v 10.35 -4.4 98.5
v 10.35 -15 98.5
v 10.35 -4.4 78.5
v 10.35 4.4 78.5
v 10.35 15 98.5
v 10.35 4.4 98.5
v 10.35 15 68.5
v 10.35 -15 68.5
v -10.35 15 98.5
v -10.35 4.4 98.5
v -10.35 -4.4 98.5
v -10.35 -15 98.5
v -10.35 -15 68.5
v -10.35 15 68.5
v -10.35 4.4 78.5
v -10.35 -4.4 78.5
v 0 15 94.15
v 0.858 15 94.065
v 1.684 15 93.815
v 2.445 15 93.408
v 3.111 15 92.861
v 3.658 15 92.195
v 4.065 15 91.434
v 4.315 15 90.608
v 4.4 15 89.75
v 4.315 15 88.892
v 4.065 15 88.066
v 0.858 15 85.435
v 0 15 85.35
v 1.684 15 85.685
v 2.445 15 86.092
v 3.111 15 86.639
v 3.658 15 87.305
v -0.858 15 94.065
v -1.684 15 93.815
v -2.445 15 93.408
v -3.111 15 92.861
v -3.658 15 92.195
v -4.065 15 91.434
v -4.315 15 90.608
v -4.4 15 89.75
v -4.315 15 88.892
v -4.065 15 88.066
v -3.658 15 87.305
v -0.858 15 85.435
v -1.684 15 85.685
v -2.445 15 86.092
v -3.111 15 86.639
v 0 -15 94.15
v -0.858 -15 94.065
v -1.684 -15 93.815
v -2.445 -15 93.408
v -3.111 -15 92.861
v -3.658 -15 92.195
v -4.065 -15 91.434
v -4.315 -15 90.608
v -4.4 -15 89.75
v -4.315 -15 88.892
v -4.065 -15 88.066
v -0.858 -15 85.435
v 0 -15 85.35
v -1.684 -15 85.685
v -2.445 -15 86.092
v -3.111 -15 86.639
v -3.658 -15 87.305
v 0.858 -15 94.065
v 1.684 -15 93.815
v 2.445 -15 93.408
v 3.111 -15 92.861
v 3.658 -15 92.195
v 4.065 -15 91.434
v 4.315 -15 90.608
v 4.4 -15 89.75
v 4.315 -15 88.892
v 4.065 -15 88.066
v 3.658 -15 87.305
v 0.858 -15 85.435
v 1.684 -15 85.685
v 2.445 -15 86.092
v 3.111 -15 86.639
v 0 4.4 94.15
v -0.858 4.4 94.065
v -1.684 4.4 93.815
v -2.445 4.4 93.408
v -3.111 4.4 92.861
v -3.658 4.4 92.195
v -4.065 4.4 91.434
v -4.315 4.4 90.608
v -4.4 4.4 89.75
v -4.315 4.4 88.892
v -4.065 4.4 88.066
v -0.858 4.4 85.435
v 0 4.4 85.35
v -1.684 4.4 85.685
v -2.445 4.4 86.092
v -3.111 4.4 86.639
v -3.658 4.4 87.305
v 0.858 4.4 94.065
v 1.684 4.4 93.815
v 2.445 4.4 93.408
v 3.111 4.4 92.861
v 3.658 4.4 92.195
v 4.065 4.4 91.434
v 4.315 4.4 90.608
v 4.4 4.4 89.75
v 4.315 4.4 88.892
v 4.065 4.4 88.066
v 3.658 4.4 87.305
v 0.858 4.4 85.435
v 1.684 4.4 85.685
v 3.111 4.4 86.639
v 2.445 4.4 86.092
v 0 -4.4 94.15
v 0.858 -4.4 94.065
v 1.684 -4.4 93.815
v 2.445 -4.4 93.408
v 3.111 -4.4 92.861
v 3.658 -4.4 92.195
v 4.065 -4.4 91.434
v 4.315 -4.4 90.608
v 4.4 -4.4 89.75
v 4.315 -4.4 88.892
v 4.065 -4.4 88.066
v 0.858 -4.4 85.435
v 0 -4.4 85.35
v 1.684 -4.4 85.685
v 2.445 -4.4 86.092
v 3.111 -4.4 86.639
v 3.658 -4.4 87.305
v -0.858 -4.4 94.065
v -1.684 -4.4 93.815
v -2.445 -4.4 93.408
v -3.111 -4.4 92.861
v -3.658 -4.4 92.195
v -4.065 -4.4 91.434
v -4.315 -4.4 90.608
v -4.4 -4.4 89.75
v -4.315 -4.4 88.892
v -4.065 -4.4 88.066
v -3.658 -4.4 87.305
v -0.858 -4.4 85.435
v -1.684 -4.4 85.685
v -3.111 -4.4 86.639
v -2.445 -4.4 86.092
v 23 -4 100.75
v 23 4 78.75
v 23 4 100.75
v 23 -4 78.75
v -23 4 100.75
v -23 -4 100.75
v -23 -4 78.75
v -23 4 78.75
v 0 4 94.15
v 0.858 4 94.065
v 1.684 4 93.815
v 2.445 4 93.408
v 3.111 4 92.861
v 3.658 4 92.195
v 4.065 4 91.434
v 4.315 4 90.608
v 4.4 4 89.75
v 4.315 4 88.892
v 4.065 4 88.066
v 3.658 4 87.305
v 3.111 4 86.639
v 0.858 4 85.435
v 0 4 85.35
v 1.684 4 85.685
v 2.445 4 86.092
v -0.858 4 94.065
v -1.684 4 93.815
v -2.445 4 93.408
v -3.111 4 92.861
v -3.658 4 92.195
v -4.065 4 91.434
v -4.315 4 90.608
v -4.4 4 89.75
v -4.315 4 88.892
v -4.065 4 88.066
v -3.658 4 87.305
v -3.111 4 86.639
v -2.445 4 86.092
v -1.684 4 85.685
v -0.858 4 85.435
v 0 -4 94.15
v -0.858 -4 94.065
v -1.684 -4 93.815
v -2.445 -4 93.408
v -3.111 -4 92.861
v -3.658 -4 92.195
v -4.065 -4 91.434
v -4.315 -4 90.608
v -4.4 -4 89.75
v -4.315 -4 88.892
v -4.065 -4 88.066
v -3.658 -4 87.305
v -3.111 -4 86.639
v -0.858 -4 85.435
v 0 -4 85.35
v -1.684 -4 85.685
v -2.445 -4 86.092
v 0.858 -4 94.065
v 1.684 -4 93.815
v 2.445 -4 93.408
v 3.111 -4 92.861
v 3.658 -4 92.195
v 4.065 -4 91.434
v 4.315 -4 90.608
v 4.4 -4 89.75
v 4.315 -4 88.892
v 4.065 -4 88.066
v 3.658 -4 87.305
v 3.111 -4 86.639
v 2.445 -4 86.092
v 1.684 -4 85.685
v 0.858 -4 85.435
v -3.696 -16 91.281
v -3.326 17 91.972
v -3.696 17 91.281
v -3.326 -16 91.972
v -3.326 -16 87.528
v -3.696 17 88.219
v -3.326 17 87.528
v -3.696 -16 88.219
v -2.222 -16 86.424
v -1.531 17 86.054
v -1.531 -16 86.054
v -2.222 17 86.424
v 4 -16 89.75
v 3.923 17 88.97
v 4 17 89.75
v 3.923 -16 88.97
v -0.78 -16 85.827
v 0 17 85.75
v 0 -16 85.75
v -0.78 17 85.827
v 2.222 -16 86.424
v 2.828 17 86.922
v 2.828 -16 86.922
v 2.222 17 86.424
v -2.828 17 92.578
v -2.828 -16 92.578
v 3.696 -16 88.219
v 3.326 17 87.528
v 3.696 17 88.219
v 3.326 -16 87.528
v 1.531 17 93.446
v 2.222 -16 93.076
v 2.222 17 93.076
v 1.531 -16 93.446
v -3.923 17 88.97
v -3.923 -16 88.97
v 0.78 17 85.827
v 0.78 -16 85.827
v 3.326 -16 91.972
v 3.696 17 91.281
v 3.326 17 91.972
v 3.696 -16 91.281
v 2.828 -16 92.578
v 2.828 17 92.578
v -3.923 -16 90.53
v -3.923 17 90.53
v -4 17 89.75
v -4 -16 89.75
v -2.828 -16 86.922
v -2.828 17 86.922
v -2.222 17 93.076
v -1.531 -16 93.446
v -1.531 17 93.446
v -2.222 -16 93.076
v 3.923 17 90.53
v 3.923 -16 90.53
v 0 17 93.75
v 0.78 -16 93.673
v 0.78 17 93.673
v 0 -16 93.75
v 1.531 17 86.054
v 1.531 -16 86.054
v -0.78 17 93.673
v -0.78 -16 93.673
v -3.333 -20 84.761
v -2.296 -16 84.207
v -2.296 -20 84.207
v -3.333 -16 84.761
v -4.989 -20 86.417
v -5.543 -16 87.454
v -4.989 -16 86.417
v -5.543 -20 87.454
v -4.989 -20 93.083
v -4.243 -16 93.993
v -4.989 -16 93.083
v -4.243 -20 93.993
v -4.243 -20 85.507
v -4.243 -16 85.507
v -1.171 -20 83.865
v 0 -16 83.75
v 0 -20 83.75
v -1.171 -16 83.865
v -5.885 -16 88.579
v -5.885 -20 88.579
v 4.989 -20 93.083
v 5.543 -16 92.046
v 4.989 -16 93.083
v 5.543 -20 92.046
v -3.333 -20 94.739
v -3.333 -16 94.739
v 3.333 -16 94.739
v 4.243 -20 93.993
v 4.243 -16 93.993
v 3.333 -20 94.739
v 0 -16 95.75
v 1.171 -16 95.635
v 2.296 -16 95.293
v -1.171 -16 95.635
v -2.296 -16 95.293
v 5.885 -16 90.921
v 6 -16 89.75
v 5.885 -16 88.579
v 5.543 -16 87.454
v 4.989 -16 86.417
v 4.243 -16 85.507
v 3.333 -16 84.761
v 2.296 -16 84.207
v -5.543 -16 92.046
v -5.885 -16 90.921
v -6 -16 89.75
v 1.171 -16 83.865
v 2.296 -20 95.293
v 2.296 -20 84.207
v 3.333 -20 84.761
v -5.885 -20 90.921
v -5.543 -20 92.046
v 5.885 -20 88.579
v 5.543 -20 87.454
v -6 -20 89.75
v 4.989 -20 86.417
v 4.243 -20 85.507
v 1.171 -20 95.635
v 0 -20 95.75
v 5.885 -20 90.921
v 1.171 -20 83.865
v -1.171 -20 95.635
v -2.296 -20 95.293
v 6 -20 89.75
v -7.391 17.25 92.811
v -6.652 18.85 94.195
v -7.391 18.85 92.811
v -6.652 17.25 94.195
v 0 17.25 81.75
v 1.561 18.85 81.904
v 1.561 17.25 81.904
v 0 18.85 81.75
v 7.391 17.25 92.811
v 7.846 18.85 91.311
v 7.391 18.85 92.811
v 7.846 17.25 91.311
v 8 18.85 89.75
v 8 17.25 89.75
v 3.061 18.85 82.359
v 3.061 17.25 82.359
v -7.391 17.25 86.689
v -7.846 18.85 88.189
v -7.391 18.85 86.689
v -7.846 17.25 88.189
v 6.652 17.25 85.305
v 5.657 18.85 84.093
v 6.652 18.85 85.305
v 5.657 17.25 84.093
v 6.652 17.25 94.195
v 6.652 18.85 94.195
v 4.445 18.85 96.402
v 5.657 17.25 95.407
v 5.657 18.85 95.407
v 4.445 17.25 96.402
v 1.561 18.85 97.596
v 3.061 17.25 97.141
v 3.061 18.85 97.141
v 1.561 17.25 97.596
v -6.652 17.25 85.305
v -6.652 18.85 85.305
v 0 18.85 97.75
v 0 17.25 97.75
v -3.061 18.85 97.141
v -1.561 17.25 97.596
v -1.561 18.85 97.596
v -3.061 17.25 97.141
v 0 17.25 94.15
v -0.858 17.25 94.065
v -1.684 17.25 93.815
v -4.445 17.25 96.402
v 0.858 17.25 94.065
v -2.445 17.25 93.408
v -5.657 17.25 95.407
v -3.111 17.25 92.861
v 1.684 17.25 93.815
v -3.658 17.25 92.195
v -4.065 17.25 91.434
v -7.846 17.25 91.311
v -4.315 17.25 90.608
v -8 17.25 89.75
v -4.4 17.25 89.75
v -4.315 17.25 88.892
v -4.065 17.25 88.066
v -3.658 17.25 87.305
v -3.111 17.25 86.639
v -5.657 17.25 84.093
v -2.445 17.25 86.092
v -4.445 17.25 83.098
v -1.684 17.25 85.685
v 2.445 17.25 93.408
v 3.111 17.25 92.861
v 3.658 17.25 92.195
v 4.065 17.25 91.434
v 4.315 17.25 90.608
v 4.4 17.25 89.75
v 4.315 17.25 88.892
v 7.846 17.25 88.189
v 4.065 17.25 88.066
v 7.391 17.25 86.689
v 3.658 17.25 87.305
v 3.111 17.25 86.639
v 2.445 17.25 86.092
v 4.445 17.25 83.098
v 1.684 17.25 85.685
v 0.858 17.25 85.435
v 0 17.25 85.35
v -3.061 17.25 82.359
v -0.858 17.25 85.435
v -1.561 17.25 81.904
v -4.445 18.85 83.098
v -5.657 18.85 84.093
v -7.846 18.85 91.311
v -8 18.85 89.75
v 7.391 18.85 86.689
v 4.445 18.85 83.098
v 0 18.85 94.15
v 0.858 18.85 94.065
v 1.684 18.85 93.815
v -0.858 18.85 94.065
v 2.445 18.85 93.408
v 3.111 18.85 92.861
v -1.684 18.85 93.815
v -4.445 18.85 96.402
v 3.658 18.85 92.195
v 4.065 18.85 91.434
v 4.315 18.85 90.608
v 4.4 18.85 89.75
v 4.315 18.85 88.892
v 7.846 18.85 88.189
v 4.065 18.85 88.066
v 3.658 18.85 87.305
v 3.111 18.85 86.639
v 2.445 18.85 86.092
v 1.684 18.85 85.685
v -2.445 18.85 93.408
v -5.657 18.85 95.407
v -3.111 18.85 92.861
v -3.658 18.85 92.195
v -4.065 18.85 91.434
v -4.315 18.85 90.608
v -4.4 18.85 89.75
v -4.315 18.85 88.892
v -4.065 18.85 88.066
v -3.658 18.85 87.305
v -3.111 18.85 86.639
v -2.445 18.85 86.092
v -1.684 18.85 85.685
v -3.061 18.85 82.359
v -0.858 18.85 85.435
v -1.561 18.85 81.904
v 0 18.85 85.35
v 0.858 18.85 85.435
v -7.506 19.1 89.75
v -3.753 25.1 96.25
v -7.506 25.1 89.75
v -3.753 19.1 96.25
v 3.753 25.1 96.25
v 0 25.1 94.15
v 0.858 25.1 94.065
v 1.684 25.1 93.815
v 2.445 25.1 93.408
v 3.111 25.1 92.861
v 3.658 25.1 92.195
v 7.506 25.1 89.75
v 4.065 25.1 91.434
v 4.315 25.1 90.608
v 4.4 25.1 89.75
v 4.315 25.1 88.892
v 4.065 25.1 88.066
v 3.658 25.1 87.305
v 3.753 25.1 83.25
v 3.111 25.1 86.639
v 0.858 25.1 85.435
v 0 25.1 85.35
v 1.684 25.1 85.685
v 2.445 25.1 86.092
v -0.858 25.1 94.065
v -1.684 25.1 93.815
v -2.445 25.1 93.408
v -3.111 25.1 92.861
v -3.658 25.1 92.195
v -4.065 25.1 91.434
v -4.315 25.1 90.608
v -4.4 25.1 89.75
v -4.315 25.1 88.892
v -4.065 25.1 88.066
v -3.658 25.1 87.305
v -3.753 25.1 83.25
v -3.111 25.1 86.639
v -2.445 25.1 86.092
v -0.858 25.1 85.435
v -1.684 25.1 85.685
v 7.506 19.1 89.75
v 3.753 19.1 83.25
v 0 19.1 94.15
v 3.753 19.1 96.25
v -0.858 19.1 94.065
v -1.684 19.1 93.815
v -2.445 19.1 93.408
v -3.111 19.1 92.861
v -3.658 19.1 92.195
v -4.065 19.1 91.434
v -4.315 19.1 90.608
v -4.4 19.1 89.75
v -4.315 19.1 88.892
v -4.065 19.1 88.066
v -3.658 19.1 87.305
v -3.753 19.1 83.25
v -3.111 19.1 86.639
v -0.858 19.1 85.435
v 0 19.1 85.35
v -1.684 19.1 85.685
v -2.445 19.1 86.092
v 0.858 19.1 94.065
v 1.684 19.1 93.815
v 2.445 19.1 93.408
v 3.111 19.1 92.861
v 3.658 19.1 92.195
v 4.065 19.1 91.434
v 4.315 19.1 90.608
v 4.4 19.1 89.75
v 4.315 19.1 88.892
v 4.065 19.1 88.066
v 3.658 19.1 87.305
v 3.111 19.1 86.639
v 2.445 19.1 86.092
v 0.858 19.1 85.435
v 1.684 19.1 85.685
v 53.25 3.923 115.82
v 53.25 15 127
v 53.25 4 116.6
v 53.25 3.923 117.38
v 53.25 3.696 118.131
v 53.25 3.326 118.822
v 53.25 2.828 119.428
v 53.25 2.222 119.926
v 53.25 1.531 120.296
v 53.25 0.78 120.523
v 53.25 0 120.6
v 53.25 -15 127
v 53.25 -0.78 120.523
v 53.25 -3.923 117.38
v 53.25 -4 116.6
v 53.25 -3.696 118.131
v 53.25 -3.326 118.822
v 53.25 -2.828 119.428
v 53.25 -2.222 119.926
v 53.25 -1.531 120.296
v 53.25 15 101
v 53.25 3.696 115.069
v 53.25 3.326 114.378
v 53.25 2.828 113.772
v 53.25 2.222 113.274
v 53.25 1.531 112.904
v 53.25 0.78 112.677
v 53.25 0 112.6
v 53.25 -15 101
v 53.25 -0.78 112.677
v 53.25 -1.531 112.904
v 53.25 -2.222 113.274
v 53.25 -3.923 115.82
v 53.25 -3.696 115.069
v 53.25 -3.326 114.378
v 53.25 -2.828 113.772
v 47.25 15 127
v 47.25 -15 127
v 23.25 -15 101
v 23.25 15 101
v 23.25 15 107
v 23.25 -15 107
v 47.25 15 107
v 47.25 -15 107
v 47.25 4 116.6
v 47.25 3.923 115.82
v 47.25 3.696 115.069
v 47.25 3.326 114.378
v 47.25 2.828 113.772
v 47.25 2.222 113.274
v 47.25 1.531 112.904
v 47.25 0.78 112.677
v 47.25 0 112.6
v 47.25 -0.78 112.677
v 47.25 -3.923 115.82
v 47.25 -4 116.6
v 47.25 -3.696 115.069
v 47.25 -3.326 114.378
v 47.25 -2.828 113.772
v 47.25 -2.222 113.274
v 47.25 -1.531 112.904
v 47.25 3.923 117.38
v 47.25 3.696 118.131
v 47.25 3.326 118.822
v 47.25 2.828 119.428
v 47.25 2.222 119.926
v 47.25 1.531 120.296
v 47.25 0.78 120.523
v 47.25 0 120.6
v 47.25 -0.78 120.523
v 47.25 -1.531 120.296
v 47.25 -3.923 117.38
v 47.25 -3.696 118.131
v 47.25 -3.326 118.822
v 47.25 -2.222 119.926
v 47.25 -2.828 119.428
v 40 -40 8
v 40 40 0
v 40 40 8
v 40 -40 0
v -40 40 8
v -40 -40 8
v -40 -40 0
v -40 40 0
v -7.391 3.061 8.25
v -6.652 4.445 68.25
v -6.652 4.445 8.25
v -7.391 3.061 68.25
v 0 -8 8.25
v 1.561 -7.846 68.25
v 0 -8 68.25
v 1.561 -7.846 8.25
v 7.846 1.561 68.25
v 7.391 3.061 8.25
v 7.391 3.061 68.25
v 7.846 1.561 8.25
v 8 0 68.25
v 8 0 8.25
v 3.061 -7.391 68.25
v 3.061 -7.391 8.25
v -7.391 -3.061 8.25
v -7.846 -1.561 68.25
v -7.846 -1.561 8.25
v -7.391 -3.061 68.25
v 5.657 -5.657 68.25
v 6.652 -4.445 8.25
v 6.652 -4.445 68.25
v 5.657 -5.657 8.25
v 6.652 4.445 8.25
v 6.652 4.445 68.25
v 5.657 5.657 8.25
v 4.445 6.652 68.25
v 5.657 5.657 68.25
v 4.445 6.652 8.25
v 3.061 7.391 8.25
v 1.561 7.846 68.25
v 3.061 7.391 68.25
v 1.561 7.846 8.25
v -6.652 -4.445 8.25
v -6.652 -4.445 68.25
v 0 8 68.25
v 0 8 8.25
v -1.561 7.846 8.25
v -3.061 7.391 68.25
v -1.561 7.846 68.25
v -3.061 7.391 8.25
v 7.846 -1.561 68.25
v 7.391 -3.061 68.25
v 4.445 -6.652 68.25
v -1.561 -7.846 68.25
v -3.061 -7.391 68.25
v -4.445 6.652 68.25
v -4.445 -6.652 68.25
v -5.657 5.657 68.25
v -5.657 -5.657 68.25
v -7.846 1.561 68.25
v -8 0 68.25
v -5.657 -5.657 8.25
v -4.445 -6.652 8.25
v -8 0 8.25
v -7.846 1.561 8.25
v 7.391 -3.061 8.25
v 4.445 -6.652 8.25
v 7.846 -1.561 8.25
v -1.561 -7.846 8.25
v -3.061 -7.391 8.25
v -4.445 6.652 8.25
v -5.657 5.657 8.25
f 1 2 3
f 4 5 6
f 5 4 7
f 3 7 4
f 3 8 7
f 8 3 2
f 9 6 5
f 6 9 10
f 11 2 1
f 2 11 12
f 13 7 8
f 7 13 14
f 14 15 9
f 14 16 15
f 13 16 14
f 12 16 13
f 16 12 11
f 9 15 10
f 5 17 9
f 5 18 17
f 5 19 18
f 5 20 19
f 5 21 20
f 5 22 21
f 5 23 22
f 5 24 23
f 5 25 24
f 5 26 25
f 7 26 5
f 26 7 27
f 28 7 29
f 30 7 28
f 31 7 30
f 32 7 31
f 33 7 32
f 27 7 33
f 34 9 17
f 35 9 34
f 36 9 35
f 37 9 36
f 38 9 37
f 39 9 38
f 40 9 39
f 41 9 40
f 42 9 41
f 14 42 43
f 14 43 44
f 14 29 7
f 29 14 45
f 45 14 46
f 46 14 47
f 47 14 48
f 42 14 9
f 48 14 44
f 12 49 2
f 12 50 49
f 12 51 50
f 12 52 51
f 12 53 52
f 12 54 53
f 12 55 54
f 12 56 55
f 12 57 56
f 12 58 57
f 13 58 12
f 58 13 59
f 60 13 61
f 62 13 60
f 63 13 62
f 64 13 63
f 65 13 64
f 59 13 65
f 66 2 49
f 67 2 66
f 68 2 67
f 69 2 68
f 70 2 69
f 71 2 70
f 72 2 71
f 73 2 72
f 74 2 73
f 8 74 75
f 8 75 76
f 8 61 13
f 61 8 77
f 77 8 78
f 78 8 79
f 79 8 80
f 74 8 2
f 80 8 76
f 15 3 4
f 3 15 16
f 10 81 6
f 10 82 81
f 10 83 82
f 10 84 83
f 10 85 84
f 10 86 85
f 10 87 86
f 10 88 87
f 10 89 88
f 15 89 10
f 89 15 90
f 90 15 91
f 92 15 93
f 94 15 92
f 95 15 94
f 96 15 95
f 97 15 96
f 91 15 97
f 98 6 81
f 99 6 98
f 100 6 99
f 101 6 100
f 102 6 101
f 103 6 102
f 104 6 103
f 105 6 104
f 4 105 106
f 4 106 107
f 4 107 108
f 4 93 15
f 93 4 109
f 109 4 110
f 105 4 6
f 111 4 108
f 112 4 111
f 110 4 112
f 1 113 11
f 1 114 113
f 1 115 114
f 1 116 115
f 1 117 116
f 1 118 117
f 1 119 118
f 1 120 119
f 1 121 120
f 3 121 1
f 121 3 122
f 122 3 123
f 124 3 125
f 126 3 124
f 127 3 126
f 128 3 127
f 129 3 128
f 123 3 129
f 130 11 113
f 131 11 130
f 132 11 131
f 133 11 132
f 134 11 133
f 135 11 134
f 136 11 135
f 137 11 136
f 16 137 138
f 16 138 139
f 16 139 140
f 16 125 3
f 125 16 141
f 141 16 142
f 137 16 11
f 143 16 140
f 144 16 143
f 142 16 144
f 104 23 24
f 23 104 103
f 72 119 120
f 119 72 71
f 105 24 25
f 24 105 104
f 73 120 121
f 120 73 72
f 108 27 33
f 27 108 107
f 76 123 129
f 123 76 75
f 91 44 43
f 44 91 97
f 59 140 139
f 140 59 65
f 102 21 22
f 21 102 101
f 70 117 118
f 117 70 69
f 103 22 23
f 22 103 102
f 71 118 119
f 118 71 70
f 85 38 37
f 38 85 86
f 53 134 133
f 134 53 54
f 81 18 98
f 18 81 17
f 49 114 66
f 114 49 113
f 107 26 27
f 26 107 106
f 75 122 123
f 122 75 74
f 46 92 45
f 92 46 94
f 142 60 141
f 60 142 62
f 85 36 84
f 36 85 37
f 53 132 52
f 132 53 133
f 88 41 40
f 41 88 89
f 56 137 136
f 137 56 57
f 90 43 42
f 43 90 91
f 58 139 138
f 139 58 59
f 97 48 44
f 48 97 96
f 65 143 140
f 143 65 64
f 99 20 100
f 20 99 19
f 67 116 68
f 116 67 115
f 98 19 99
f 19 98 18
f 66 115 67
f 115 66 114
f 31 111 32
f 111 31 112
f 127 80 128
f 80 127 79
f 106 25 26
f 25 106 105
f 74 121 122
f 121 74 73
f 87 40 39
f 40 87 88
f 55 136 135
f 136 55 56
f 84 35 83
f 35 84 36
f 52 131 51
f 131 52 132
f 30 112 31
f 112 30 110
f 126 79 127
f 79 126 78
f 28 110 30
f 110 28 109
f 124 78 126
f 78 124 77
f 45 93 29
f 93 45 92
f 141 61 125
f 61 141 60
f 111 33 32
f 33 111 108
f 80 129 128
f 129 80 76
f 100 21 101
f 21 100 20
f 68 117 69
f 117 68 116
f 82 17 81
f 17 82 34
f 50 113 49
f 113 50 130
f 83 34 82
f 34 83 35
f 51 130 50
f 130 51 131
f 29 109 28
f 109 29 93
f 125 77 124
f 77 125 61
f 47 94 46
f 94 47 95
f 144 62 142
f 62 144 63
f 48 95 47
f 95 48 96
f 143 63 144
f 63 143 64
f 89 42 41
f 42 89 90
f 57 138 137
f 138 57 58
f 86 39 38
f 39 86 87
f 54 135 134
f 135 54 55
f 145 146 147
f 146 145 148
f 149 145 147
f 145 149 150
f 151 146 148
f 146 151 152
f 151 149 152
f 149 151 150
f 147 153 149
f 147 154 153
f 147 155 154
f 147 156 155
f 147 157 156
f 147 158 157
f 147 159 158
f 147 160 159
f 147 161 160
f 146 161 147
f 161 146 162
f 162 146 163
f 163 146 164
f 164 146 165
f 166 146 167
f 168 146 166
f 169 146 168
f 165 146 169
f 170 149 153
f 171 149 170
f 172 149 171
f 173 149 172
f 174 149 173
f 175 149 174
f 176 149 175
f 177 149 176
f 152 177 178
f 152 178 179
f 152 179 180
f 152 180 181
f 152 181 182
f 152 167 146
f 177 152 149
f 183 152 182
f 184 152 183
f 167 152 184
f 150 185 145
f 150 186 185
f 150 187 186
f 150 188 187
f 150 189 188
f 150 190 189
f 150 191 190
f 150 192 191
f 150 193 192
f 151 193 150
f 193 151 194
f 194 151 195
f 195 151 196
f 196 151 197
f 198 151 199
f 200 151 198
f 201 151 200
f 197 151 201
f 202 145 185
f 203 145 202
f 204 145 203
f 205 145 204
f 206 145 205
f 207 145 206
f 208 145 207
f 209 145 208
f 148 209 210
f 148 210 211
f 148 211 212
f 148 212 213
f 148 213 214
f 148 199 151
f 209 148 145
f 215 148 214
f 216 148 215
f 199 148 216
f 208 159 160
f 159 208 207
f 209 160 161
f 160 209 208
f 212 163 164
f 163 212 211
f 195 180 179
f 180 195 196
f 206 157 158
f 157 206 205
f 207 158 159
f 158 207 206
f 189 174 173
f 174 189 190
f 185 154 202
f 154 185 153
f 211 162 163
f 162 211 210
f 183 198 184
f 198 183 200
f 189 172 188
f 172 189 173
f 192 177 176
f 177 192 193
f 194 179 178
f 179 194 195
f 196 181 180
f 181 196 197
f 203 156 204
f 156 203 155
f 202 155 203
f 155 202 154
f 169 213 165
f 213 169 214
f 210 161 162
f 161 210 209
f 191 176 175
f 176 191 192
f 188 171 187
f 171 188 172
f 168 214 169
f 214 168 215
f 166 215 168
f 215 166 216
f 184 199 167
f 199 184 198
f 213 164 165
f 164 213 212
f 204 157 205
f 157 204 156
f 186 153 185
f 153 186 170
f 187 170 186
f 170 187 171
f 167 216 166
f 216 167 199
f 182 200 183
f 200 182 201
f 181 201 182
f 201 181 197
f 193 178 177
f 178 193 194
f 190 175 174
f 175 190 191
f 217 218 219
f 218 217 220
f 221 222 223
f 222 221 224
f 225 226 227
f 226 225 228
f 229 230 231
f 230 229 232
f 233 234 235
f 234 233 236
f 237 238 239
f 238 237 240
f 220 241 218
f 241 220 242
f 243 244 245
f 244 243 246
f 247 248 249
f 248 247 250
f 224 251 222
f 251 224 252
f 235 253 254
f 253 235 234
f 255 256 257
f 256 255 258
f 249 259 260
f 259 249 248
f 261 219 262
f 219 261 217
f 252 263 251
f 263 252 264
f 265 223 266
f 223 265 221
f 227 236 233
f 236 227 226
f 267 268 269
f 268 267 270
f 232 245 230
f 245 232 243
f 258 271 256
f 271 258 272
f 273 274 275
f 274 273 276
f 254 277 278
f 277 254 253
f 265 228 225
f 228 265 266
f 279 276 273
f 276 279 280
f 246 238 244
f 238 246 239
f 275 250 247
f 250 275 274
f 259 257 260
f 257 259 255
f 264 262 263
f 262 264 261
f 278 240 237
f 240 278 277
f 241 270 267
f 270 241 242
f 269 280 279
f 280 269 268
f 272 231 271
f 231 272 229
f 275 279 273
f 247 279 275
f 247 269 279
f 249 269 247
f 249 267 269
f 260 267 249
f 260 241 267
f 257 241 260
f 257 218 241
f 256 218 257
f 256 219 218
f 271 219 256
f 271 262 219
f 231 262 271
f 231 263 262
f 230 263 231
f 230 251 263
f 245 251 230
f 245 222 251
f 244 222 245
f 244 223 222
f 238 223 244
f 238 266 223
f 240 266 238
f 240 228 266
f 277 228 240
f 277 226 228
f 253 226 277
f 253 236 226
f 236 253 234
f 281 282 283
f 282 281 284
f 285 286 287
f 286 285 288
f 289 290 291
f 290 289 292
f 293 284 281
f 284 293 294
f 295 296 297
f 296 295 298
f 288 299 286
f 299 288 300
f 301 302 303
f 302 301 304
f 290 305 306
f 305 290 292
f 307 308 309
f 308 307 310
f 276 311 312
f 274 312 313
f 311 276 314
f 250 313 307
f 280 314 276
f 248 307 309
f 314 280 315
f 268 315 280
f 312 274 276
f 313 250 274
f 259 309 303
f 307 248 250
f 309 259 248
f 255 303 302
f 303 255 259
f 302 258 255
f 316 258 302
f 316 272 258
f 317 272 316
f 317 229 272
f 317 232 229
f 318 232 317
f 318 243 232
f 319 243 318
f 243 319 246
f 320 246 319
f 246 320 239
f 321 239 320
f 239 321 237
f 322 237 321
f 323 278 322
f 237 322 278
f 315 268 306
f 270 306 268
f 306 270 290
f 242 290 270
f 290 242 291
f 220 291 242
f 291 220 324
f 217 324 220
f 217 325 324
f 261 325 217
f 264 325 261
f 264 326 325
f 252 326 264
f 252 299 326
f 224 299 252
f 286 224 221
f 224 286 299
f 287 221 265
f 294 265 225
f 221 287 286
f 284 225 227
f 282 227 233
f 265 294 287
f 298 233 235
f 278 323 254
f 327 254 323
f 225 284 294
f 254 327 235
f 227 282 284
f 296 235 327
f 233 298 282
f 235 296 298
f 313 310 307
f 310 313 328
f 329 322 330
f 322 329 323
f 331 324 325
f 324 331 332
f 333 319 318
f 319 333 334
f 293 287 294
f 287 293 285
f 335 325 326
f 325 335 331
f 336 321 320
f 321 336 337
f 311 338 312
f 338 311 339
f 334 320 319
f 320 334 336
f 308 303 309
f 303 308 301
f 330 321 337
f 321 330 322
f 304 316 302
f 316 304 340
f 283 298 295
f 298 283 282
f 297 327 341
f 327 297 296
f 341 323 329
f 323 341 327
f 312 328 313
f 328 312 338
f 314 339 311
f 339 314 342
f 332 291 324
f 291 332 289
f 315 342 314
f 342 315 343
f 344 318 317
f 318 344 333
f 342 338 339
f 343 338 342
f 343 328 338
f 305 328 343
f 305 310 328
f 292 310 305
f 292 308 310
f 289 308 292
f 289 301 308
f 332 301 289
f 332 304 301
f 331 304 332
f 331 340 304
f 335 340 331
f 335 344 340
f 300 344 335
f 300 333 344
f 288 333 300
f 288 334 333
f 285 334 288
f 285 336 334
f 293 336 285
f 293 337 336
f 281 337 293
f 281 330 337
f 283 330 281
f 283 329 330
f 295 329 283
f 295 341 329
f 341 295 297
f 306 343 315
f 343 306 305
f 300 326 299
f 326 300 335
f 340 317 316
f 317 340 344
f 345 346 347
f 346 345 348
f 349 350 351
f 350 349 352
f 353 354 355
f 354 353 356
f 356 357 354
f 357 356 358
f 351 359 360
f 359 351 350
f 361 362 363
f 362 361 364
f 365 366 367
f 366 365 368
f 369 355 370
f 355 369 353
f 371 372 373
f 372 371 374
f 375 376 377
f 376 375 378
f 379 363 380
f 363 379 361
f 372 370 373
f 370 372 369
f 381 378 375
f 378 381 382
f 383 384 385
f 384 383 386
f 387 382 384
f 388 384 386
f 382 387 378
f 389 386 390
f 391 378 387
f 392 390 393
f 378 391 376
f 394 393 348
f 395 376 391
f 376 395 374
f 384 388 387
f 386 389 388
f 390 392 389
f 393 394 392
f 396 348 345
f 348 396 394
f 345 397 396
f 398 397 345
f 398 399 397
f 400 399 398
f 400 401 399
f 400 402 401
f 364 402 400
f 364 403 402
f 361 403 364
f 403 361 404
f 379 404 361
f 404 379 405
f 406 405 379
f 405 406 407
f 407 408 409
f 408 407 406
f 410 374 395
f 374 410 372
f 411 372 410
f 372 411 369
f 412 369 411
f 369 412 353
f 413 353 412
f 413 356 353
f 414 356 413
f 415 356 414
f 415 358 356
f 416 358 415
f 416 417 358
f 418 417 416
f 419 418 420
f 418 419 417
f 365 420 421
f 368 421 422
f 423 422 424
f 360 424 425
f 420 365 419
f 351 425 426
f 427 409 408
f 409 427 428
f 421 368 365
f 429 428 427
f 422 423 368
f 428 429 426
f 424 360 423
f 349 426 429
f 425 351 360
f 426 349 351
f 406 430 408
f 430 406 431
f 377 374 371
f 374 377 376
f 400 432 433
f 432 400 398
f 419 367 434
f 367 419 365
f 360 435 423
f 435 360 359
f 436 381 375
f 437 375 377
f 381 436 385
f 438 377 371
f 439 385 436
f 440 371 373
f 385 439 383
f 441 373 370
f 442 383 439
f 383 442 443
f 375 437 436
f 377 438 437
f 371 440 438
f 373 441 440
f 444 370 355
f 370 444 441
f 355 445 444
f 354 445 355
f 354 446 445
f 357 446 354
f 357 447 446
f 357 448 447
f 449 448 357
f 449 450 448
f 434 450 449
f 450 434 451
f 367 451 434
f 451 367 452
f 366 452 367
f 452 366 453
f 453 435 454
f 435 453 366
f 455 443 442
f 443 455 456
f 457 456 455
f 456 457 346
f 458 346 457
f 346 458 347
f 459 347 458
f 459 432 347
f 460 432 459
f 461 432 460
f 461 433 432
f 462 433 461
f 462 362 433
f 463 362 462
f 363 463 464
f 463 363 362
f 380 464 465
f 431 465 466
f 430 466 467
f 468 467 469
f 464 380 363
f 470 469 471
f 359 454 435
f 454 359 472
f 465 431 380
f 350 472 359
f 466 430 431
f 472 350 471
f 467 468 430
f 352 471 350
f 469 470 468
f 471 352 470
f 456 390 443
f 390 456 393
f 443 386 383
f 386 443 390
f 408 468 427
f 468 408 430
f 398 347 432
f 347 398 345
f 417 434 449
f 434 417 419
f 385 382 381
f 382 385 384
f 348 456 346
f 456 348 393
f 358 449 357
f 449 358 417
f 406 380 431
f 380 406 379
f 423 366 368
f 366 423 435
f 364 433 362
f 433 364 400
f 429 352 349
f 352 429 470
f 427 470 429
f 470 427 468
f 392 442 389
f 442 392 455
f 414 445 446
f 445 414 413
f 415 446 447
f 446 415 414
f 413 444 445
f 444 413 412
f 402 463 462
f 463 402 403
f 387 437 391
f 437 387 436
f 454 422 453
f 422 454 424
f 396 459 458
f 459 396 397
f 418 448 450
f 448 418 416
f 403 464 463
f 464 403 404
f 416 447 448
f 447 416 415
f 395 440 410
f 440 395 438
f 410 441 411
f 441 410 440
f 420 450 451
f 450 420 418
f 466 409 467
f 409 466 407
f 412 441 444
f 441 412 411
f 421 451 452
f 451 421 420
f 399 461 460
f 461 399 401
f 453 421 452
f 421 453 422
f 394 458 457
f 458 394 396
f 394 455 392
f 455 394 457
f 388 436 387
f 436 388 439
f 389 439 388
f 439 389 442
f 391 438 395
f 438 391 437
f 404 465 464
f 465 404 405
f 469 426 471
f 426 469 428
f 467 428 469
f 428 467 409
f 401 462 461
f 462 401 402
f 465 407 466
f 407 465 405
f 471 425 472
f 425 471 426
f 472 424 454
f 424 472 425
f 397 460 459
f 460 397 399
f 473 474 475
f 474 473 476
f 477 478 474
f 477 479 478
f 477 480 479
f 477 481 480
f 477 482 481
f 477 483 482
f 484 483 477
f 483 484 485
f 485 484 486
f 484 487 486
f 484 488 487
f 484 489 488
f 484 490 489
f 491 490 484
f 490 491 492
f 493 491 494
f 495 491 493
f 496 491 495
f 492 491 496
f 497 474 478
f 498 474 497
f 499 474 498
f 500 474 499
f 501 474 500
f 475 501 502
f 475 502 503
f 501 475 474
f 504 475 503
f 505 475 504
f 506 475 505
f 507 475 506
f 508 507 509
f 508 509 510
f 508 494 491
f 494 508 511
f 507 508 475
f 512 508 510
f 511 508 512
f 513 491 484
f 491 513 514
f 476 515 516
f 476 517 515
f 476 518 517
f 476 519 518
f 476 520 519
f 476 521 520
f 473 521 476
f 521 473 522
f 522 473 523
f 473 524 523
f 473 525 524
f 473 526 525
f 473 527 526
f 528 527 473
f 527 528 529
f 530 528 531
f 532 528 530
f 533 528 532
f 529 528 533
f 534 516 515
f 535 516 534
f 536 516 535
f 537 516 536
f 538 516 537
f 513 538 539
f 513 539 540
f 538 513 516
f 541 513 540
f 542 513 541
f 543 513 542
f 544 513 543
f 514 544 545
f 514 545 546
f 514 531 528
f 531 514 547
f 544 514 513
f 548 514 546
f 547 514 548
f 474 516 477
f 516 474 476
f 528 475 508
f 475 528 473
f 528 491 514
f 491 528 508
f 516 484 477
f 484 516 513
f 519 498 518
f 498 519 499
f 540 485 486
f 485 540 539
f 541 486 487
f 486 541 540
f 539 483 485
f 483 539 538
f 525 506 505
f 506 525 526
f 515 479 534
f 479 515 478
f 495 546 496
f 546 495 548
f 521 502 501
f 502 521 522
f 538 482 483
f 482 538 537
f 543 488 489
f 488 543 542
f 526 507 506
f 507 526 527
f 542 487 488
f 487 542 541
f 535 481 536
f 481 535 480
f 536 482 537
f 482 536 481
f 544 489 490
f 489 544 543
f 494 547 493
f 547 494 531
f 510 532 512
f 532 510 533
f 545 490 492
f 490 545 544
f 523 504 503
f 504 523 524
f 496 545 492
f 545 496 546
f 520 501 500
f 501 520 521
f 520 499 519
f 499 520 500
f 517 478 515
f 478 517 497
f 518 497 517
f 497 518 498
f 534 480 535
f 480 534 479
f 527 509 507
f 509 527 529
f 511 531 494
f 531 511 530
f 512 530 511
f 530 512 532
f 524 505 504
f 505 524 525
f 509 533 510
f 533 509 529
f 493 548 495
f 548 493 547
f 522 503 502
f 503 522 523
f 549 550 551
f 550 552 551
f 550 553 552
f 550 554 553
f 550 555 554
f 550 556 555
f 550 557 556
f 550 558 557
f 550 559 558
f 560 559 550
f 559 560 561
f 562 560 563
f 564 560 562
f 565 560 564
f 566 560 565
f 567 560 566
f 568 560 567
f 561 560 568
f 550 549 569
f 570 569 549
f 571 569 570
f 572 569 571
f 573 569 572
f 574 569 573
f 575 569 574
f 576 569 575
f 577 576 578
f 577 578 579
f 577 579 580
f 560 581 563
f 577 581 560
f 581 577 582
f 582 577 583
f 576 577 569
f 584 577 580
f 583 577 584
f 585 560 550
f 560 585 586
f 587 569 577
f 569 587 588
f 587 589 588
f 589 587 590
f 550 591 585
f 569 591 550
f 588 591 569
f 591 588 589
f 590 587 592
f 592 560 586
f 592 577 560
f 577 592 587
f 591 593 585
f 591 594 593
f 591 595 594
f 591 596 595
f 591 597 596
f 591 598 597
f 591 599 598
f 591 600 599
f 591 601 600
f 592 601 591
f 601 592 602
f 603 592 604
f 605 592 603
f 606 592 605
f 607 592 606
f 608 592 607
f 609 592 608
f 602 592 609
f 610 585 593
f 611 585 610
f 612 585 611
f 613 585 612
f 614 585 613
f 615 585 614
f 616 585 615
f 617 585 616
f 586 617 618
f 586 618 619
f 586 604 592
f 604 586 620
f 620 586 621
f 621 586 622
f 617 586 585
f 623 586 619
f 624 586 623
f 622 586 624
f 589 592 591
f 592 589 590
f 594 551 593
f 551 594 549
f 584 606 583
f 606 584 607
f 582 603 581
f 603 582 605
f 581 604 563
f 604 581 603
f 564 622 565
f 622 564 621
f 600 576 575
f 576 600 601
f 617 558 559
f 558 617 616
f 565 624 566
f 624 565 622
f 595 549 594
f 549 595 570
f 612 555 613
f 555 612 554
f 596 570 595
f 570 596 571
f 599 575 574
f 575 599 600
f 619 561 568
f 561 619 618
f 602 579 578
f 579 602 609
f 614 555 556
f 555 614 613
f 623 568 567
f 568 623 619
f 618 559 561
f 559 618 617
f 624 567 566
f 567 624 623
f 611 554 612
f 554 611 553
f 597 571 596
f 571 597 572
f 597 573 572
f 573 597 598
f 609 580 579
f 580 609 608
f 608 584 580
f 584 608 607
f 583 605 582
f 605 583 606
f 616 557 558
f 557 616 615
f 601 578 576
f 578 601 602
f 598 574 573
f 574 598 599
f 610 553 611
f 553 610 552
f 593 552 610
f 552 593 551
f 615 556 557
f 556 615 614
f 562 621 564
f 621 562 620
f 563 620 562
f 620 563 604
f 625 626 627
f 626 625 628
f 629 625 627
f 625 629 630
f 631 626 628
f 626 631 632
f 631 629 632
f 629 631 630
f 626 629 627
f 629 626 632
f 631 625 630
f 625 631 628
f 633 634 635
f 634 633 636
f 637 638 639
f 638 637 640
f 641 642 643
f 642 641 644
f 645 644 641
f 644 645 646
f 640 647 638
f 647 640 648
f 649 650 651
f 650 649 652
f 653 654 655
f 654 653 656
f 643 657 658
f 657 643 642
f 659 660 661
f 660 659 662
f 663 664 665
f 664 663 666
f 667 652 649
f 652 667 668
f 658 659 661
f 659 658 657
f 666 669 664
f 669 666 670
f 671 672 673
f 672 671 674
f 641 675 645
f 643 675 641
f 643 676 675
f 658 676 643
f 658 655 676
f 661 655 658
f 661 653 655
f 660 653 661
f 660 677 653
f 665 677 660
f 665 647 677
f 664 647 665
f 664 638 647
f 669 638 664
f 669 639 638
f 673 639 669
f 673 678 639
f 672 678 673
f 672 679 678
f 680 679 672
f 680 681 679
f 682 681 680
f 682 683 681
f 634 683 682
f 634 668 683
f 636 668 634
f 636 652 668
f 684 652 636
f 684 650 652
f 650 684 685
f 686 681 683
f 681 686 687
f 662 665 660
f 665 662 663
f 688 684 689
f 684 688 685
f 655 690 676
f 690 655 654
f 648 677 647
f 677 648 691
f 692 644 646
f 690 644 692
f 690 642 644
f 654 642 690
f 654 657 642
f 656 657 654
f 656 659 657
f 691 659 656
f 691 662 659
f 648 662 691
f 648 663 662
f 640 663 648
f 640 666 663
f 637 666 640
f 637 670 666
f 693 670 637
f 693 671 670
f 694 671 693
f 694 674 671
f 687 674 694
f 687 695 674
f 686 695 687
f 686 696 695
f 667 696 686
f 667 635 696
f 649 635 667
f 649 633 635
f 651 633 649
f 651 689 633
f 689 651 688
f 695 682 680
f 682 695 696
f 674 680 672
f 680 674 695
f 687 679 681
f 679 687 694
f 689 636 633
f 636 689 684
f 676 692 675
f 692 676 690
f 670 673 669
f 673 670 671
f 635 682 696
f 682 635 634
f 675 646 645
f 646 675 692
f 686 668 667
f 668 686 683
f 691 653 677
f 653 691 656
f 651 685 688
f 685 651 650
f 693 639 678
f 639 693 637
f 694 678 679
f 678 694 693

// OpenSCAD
$fn = 32;

// ------------------------------------------------------------------------
// Lamp arm: column d16 x 60 mm, arm 46 mm
// Every part is its own module, assembly() places every instance.
// ------------------------------------------------------------------------

// --- part 1 ---
module lamp_base() {
  difference() {
    translate([-40, -40, 0]) cube([80, 80, 8]);
  }
}

// --- part 2 ---
module lamp_column() {
  cylinder(h = 60, d = 16);
}

// --- part 3 ---
module head_fork() {
  difference() {
    translate([-10.35, -15, 0]) cube([20.7, 30, 30]);
    translate([-11.35, -4.4, 10]) cube([22.7, 8.8, 21]);
    translate([0, 0, 21.25]) rotate([90, 0, 0]) cylinder(h = 32, d = 8.8, center = true);
  }
}

// --- part 4 ---
module lamp_arm() {
  difference() {
    translate([-23, -4, 0]) cube([46, 8, 22]);
    translate([0, 0, 11]) rotate([90, 0, 0]) cylinder(h = 10, d = 8.8, center = true);
  }
}

// --- part 5 ---
module arm_pin() {
  rotate([0, 90, 0]) cylinder(h = 34, d = 8, center = true);
  translate([-20, 0, 0]) rotate([0, 90, 0]) cylinder(h = 4, d = 12);
}

// --- part 6 ---
module arm_washer() {
  difference() {
      translate([0, 0, 0]) cylinder(h = 1.6, d = 16);
      translate([0, 0, -1]) cylinder(h = 3.6, d = 8.8);
    }
}

// --- part 7 ---
module arm_nut() {
  difference() {
    linear_extrude(height = 6) polygon(points = [[7.506, 0], [3.753, 6.5], [-3.753, 6.5], [-7.506, 0], [-3.753, -6.5], [3.753, -6.5]]);
    translate([0, 0, -1]) cylinder(h = 8, d = 8.8);
  }
}

// --- part 8 ---
module shade_bracket() {
  difference() {
    translate([-15, -15, 0]) cube([30, 30, 26]);
    translate([-16, -16, 6]) cube([25, 32, 21]);
    translate([12, 0, 15.6]) rotate([0, 90, 0]) cylinder(h = 8, d = 8, center = true);
  }
}

// --- assembly ---
module assembly() {
  color([0.80, 0.24, 0.20]) translate([0, 0, 0]) rotate([0, 0, 0]) lamp_base();
  color([0.20, 0.45, 0.75]) translate([0, 0, 8.25]) rotate([0, 0, 0]) lamp_column();
  color([0.25, 0.62, 0.32]) translate([0, 0, 68.5]) rotate([0, 0, 0]) head_fork();
  color([0.92, 0.70, 0.18]) translate([0, 0, 78.75]) rotate([0, 0, 0]) lamp_arm();
  color([0.58, 0.35, 0.70]) translate([0, 0, 89.75]) rotate([0, 0, 90]) arm_pin();
  color([0.16, 0.66, 0.66]) translate([0, 18.85, 89.75]) rotate([90, 0, 0]) arm_washer();
  color([0.85, 0.48, 0.18]) translate([0, 25.1, 89.75]) rotate([90, 0, 0]) arm_nut();
  color([0.55, 0.60, 0.65]) translate([38.25, 0, 101]) rotate([0, 0, 0]) shade_bracket();
}

assembly();
